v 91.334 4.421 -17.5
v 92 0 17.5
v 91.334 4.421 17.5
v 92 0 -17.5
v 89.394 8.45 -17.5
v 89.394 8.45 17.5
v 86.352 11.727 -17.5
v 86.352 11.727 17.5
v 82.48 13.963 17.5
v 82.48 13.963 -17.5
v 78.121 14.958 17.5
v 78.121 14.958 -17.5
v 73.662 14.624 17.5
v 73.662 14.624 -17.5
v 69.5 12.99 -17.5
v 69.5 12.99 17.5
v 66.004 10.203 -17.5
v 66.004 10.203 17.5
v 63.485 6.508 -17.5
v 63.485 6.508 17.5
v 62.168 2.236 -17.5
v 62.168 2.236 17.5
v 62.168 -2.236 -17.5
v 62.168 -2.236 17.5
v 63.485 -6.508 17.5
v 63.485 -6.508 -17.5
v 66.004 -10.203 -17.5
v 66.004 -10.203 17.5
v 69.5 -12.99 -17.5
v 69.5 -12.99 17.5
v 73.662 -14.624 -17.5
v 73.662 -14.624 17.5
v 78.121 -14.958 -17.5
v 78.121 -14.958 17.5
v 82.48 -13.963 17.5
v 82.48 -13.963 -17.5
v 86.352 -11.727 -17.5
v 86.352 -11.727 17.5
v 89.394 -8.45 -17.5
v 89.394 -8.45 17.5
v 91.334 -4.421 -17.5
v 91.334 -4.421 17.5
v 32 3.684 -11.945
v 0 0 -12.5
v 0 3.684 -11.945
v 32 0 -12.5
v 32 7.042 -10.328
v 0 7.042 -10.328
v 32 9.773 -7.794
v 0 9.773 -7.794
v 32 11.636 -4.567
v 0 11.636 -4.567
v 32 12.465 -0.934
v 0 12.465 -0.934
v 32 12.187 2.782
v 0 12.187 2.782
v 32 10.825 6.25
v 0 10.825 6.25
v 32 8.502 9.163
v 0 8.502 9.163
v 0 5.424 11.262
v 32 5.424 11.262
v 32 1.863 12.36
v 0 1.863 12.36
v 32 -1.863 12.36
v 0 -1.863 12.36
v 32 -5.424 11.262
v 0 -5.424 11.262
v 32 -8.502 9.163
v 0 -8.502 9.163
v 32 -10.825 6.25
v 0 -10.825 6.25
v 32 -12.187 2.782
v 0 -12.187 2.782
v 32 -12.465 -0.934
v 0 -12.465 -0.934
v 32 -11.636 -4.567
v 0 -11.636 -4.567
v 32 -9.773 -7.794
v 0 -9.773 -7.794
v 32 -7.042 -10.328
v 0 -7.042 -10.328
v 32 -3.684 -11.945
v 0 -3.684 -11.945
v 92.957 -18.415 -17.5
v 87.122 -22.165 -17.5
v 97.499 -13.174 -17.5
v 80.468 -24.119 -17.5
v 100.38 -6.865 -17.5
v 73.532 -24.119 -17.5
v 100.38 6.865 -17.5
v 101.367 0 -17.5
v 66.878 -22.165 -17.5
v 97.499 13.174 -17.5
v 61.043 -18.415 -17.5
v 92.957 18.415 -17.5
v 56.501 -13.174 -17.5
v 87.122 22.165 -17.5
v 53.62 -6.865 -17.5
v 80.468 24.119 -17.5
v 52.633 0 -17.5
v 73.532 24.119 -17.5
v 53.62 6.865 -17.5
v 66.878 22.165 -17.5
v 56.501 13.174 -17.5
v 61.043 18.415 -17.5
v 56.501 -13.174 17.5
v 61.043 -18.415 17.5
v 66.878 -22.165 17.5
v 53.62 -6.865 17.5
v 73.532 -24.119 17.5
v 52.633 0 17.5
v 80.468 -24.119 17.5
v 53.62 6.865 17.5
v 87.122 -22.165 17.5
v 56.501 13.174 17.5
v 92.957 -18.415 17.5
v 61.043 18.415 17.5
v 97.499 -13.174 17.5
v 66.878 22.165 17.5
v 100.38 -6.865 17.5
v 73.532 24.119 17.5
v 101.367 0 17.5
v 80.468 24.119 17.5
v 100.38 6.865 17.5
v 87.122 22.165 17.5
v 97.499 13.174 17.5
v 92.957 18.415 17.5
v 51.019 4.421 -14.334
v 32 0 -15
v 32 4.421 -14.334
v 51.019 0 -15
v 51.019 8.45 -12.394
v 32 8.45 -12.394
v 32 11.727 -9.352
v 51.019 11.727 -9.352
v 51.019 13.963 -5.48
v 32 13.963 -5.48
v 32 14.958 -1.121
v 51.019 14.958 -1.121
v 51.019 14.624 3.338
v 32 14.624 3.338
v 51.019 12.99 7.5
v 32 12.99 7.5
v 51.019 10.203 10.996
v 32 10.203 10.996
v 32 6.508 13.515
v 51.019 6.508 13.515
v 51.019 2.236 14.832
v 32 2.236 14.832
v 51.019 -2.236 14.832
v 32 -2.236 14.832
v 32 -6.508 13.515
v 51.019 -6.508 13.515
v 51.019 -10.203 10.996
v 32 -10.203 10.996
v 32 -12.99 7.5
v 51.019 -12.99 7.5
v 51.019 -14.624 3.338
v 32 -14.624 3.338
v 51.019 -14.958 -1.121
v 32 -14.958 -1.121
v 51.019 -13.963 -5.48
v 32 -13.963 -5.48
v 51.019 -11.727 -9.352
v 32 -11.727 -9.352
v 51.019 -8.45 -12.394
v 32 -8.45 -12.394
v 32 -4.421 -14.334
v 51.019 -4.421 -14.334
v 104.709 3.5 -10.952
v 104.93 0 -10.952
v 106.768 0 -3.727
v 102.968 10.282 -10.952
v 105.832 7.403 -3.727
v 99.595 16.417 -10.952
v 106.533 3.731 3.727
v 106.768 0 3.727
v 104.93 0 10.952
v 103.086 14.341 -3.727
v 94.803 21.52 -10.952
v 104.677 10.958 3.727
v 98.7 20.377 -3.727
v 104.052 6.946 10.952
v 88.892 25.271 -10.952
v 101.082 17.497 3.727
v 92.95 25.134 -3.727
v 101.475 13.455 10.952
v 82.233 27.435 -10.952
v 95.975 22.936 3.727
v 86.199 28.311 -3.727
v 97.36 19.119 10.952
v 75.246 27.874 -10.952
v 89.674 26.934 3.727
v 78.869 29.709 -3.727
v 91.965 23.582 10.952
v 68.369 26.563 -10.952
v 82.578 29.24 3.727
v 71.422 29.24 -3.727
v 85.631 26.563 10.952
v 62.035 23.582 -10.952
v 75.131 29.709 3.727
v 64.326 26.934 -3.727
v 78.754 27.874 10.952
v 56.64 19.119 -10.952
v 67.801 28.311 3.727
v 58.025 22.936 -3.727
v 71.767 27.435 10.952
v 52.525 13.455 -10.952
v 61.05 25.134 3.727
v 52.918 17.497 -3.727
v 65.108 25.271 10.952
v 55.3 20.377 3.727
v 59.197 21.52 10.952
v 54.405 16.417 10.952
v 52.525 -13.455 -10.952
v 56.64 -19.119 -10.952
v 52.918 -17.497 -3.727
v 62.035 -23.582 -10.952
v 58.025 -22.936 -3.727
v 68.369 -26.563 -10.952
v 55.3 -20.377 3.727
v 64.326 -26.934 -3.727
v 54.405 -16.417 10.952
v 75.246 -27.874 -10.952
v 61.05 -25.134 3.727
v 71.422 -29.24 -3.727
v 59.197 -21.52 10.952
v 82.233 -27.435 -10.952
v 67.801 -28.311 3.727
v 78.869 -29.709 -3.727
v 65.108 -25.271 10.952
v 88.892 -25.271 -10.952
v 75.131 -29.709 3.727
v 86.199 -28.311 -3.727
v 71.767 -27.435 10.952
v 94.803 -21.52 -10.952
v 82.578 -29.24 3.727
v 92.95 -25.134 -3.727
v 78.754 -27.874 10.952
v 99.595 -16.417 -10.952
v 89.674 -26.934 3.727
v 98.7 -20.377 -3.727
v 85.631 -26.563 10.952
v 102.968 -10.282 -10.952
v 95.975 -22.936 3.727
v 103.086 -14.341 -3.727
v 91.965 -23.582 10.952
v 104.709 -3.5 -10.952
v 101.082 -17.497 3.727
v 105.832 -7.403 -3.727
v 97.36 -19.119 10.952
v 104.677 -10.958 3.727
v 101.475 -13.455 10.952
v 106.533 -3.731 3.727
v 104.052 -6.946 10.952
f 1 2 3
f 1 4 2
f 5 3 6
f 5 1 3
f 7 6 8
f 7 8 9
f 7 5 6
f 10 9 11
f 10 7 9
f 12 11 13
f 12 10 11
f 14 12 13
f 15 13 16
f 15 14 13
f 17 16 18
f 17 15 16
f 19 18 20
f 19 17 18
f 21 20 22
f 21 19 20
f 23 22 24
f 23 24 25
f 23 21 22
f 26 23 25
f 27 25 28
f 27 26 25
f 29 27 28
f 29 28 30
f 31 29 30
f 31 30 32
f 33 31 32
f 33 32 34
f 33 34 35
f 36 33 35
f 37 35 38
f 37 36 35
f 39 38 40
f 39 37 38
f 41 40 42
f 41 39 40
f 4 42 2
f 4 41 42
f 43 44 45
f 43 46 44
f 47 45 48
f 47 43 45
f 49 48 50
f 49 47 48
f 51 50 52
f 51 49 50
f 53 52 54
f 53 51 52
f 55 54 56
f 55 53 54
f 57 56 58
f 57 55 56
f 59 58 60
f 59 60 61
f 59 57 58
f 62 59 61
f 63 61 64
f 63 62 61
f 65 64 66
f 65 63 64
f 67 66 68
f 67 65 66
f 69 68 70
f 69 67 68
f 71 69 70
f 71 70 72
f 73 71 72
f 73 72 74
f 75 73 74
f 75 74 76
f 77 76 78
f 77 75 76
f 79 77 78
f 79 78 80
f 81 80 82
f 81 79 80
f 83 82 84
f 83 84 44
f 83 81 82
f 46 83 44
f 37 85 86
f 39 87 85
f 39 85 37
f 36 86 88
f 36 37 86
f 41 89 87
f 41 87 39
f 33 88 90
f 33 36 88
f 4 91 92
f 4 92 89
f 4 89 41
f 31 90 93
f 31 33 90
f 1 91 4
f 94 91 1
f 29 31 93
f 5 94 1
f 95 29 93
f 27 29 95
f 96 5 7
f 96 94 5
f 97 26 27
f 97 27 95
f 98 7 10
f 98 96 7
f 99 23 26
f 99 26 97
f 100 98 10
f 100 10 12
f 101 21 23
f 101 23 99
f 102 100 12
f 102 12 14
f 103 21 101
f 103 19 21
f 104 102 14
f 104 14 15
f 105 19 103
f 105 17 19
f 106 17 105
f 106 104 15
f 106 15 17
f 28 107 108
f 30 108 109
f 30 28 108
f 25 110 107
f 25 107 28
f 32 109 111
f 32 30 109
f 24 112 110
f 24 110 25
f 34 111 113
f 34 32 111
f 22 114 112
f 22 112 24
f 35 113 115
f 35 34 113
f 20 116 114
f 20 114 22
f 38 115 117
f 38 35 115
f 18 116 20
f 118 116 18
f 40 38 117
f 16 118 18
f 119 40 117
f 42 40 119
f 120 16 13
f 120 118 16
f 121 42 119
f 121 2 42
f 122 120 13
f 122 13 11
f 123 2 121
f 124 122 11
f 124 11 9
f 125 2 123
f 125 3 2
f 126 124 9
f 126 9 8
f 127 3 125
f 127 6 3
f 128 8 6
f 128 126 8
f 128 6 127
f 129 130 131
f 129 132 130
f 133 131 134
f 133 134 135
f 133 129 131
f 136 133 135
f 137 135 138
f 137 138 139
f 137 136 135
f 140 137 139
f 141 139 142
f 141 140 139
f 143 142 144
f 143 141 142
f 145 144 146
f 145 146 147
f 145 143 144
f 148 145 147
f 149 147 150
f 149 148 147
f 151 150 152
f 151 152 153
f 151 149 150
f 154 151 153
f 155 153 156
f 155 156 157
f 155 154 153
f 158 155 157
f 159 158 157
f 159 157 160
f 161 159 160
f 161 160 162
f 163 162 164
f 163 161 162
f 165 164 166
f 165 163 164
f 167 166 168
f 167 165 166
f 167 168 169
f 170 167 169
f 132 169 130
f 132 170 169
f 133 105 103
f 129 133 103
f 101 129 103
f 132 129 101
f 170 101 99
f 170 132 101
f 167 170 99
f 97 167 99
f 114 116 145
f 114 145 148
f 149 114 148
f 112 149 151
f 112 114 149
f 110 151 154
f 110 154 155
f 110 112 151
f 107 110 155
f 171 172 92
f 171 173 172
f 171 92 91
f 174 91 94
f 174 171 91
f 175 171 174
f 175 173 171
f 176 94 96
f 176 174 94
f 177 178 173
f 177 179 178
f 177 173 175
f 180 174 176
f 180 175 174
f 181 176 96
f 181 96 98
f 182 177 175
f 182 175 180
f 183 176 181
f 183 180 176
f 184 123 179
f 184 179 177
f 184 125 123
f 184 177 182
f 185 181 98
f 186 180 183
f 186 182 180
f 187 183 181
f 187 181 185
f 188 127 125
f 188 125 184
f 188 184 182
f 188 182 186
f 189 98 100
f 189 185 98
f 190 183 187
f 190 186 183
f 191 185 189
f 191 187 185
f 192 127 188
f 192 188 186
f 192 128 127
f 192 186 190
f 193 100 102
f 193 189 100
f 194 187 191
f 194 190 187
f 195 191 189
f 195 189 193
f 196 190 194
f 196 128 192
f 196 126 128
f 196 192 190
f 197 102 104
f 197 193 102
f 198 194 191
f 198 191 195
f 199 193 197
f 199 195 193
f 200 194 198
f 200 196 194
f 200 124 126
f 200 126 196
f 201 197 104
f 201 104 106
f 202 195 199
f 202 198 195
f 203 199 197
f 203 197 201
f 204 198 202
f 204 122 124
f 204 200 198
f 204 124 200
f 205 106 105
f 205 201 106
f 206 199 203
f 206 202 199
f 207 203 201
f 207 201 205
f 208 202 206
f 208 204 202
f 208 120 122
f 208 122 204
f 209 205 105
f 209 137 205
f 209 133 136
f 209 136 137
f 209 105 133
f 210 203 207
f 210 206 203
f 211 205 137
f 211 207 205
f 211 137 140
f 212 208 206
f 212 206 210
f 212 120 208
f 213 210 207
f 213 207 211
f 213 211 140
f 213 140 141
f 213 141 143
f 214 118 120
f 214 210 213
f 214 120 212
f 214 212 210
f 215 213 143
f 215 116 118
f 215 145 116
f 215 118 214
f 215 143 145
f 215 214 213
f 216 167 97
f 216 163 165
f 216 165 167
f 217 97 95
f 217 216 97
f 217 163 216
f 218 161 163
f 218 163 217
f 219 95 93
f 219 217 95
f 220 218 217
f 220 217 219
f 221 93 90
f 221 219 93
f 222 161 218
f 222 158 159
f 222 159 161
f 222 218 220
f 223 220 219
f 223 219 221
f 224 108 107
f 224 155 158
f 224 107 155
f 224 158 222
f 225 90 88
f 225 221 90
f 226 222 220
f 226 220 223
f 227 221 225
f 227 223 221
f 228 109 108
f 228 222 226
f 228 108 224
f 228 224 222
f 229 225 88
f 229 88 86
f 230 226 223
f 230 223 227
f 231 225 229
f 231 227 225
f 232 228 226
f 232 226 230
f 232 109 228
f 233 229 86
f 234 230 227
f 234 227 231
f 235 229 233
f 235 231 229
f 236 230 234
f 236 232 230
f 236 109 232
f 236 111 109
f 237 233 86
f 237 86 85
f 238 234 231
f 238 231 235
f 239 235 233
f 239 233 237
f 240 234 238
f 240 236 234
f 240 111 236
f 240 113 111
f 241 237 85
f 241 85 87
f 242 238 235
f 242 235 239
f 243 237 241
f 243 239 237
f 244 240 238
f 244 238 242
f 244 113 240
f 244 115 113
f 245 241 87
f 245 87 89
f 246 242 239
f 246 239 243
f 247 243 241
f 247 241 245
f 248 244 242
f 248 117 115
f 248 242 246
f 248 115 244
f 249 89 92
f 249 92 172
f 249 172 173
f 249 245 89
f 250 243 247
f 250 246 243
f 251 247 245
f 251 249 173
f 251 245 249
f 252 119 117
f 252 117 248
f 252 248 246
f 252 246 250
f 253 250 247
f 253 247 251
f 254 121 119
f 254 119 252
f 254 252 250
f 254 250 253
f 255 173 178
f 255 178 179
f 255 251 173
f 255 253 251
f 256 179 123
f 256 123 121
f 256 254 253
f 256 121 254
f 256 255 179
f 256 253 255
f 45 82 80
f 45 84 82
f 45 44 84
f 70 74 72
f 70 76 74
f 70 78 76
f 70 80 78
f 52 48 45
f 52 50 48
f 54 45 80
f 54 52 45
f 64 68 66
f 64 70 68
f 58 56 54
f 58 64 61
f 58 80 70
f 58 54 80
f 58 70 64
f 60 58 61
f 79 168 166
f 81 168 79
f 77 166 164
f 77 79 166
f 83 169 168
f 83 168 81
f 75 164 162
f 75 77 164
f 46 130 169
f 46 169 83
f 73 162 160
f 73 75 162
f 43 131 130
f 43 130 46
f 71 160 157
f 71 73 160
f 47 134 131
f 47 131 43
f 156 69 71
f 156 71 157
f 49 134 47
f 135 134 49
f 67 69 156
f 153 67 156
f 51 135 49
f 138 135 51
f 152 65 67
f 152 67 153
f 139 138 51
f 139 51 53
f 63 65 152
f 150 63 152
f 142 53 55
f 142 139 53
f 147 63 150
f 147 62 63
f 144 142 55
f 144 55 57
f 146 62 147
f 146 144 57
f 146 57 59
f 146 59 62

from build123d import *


with BuildPart() as part:
    # Skica1 → Rotovat3 (revolve)
    with BuildSketch(Plane(origin=(0, 0, 0), x_dir=(1, 0, 0), z_dir=(0, 1, 0))):
        Polygon((0, 12.5), (0, 0), (51.019237886, 0), (51.019237886, 15), (32, 15), (32, 12.5), align=None)
    revolve(axis=Axis((-26.278850793, 0, 0), (1, 0, 0)))

    # Skica1<4> → Rotovat4 (revolve)
    with BuildSketch(Plane(origin=(0, 0, 0), x_dir=(1, 0, 0), z_dir=(0, 1, 0))):
        with BuildLine():
            Line((92, 17.5), (92, -17.5))
            Line((92, -17.5), (101.366985862, -17.5))
            ThreePointArc((101.366985862, -17.5), (107, 0), (101.366985862, 17.5))
            Line((101.366985862, 17.5), (92, 17.5))
        make_face()
    revolve(axis=Axis((77, 0, -76.152073434), (0, 0, 1)))


solid = part.part
